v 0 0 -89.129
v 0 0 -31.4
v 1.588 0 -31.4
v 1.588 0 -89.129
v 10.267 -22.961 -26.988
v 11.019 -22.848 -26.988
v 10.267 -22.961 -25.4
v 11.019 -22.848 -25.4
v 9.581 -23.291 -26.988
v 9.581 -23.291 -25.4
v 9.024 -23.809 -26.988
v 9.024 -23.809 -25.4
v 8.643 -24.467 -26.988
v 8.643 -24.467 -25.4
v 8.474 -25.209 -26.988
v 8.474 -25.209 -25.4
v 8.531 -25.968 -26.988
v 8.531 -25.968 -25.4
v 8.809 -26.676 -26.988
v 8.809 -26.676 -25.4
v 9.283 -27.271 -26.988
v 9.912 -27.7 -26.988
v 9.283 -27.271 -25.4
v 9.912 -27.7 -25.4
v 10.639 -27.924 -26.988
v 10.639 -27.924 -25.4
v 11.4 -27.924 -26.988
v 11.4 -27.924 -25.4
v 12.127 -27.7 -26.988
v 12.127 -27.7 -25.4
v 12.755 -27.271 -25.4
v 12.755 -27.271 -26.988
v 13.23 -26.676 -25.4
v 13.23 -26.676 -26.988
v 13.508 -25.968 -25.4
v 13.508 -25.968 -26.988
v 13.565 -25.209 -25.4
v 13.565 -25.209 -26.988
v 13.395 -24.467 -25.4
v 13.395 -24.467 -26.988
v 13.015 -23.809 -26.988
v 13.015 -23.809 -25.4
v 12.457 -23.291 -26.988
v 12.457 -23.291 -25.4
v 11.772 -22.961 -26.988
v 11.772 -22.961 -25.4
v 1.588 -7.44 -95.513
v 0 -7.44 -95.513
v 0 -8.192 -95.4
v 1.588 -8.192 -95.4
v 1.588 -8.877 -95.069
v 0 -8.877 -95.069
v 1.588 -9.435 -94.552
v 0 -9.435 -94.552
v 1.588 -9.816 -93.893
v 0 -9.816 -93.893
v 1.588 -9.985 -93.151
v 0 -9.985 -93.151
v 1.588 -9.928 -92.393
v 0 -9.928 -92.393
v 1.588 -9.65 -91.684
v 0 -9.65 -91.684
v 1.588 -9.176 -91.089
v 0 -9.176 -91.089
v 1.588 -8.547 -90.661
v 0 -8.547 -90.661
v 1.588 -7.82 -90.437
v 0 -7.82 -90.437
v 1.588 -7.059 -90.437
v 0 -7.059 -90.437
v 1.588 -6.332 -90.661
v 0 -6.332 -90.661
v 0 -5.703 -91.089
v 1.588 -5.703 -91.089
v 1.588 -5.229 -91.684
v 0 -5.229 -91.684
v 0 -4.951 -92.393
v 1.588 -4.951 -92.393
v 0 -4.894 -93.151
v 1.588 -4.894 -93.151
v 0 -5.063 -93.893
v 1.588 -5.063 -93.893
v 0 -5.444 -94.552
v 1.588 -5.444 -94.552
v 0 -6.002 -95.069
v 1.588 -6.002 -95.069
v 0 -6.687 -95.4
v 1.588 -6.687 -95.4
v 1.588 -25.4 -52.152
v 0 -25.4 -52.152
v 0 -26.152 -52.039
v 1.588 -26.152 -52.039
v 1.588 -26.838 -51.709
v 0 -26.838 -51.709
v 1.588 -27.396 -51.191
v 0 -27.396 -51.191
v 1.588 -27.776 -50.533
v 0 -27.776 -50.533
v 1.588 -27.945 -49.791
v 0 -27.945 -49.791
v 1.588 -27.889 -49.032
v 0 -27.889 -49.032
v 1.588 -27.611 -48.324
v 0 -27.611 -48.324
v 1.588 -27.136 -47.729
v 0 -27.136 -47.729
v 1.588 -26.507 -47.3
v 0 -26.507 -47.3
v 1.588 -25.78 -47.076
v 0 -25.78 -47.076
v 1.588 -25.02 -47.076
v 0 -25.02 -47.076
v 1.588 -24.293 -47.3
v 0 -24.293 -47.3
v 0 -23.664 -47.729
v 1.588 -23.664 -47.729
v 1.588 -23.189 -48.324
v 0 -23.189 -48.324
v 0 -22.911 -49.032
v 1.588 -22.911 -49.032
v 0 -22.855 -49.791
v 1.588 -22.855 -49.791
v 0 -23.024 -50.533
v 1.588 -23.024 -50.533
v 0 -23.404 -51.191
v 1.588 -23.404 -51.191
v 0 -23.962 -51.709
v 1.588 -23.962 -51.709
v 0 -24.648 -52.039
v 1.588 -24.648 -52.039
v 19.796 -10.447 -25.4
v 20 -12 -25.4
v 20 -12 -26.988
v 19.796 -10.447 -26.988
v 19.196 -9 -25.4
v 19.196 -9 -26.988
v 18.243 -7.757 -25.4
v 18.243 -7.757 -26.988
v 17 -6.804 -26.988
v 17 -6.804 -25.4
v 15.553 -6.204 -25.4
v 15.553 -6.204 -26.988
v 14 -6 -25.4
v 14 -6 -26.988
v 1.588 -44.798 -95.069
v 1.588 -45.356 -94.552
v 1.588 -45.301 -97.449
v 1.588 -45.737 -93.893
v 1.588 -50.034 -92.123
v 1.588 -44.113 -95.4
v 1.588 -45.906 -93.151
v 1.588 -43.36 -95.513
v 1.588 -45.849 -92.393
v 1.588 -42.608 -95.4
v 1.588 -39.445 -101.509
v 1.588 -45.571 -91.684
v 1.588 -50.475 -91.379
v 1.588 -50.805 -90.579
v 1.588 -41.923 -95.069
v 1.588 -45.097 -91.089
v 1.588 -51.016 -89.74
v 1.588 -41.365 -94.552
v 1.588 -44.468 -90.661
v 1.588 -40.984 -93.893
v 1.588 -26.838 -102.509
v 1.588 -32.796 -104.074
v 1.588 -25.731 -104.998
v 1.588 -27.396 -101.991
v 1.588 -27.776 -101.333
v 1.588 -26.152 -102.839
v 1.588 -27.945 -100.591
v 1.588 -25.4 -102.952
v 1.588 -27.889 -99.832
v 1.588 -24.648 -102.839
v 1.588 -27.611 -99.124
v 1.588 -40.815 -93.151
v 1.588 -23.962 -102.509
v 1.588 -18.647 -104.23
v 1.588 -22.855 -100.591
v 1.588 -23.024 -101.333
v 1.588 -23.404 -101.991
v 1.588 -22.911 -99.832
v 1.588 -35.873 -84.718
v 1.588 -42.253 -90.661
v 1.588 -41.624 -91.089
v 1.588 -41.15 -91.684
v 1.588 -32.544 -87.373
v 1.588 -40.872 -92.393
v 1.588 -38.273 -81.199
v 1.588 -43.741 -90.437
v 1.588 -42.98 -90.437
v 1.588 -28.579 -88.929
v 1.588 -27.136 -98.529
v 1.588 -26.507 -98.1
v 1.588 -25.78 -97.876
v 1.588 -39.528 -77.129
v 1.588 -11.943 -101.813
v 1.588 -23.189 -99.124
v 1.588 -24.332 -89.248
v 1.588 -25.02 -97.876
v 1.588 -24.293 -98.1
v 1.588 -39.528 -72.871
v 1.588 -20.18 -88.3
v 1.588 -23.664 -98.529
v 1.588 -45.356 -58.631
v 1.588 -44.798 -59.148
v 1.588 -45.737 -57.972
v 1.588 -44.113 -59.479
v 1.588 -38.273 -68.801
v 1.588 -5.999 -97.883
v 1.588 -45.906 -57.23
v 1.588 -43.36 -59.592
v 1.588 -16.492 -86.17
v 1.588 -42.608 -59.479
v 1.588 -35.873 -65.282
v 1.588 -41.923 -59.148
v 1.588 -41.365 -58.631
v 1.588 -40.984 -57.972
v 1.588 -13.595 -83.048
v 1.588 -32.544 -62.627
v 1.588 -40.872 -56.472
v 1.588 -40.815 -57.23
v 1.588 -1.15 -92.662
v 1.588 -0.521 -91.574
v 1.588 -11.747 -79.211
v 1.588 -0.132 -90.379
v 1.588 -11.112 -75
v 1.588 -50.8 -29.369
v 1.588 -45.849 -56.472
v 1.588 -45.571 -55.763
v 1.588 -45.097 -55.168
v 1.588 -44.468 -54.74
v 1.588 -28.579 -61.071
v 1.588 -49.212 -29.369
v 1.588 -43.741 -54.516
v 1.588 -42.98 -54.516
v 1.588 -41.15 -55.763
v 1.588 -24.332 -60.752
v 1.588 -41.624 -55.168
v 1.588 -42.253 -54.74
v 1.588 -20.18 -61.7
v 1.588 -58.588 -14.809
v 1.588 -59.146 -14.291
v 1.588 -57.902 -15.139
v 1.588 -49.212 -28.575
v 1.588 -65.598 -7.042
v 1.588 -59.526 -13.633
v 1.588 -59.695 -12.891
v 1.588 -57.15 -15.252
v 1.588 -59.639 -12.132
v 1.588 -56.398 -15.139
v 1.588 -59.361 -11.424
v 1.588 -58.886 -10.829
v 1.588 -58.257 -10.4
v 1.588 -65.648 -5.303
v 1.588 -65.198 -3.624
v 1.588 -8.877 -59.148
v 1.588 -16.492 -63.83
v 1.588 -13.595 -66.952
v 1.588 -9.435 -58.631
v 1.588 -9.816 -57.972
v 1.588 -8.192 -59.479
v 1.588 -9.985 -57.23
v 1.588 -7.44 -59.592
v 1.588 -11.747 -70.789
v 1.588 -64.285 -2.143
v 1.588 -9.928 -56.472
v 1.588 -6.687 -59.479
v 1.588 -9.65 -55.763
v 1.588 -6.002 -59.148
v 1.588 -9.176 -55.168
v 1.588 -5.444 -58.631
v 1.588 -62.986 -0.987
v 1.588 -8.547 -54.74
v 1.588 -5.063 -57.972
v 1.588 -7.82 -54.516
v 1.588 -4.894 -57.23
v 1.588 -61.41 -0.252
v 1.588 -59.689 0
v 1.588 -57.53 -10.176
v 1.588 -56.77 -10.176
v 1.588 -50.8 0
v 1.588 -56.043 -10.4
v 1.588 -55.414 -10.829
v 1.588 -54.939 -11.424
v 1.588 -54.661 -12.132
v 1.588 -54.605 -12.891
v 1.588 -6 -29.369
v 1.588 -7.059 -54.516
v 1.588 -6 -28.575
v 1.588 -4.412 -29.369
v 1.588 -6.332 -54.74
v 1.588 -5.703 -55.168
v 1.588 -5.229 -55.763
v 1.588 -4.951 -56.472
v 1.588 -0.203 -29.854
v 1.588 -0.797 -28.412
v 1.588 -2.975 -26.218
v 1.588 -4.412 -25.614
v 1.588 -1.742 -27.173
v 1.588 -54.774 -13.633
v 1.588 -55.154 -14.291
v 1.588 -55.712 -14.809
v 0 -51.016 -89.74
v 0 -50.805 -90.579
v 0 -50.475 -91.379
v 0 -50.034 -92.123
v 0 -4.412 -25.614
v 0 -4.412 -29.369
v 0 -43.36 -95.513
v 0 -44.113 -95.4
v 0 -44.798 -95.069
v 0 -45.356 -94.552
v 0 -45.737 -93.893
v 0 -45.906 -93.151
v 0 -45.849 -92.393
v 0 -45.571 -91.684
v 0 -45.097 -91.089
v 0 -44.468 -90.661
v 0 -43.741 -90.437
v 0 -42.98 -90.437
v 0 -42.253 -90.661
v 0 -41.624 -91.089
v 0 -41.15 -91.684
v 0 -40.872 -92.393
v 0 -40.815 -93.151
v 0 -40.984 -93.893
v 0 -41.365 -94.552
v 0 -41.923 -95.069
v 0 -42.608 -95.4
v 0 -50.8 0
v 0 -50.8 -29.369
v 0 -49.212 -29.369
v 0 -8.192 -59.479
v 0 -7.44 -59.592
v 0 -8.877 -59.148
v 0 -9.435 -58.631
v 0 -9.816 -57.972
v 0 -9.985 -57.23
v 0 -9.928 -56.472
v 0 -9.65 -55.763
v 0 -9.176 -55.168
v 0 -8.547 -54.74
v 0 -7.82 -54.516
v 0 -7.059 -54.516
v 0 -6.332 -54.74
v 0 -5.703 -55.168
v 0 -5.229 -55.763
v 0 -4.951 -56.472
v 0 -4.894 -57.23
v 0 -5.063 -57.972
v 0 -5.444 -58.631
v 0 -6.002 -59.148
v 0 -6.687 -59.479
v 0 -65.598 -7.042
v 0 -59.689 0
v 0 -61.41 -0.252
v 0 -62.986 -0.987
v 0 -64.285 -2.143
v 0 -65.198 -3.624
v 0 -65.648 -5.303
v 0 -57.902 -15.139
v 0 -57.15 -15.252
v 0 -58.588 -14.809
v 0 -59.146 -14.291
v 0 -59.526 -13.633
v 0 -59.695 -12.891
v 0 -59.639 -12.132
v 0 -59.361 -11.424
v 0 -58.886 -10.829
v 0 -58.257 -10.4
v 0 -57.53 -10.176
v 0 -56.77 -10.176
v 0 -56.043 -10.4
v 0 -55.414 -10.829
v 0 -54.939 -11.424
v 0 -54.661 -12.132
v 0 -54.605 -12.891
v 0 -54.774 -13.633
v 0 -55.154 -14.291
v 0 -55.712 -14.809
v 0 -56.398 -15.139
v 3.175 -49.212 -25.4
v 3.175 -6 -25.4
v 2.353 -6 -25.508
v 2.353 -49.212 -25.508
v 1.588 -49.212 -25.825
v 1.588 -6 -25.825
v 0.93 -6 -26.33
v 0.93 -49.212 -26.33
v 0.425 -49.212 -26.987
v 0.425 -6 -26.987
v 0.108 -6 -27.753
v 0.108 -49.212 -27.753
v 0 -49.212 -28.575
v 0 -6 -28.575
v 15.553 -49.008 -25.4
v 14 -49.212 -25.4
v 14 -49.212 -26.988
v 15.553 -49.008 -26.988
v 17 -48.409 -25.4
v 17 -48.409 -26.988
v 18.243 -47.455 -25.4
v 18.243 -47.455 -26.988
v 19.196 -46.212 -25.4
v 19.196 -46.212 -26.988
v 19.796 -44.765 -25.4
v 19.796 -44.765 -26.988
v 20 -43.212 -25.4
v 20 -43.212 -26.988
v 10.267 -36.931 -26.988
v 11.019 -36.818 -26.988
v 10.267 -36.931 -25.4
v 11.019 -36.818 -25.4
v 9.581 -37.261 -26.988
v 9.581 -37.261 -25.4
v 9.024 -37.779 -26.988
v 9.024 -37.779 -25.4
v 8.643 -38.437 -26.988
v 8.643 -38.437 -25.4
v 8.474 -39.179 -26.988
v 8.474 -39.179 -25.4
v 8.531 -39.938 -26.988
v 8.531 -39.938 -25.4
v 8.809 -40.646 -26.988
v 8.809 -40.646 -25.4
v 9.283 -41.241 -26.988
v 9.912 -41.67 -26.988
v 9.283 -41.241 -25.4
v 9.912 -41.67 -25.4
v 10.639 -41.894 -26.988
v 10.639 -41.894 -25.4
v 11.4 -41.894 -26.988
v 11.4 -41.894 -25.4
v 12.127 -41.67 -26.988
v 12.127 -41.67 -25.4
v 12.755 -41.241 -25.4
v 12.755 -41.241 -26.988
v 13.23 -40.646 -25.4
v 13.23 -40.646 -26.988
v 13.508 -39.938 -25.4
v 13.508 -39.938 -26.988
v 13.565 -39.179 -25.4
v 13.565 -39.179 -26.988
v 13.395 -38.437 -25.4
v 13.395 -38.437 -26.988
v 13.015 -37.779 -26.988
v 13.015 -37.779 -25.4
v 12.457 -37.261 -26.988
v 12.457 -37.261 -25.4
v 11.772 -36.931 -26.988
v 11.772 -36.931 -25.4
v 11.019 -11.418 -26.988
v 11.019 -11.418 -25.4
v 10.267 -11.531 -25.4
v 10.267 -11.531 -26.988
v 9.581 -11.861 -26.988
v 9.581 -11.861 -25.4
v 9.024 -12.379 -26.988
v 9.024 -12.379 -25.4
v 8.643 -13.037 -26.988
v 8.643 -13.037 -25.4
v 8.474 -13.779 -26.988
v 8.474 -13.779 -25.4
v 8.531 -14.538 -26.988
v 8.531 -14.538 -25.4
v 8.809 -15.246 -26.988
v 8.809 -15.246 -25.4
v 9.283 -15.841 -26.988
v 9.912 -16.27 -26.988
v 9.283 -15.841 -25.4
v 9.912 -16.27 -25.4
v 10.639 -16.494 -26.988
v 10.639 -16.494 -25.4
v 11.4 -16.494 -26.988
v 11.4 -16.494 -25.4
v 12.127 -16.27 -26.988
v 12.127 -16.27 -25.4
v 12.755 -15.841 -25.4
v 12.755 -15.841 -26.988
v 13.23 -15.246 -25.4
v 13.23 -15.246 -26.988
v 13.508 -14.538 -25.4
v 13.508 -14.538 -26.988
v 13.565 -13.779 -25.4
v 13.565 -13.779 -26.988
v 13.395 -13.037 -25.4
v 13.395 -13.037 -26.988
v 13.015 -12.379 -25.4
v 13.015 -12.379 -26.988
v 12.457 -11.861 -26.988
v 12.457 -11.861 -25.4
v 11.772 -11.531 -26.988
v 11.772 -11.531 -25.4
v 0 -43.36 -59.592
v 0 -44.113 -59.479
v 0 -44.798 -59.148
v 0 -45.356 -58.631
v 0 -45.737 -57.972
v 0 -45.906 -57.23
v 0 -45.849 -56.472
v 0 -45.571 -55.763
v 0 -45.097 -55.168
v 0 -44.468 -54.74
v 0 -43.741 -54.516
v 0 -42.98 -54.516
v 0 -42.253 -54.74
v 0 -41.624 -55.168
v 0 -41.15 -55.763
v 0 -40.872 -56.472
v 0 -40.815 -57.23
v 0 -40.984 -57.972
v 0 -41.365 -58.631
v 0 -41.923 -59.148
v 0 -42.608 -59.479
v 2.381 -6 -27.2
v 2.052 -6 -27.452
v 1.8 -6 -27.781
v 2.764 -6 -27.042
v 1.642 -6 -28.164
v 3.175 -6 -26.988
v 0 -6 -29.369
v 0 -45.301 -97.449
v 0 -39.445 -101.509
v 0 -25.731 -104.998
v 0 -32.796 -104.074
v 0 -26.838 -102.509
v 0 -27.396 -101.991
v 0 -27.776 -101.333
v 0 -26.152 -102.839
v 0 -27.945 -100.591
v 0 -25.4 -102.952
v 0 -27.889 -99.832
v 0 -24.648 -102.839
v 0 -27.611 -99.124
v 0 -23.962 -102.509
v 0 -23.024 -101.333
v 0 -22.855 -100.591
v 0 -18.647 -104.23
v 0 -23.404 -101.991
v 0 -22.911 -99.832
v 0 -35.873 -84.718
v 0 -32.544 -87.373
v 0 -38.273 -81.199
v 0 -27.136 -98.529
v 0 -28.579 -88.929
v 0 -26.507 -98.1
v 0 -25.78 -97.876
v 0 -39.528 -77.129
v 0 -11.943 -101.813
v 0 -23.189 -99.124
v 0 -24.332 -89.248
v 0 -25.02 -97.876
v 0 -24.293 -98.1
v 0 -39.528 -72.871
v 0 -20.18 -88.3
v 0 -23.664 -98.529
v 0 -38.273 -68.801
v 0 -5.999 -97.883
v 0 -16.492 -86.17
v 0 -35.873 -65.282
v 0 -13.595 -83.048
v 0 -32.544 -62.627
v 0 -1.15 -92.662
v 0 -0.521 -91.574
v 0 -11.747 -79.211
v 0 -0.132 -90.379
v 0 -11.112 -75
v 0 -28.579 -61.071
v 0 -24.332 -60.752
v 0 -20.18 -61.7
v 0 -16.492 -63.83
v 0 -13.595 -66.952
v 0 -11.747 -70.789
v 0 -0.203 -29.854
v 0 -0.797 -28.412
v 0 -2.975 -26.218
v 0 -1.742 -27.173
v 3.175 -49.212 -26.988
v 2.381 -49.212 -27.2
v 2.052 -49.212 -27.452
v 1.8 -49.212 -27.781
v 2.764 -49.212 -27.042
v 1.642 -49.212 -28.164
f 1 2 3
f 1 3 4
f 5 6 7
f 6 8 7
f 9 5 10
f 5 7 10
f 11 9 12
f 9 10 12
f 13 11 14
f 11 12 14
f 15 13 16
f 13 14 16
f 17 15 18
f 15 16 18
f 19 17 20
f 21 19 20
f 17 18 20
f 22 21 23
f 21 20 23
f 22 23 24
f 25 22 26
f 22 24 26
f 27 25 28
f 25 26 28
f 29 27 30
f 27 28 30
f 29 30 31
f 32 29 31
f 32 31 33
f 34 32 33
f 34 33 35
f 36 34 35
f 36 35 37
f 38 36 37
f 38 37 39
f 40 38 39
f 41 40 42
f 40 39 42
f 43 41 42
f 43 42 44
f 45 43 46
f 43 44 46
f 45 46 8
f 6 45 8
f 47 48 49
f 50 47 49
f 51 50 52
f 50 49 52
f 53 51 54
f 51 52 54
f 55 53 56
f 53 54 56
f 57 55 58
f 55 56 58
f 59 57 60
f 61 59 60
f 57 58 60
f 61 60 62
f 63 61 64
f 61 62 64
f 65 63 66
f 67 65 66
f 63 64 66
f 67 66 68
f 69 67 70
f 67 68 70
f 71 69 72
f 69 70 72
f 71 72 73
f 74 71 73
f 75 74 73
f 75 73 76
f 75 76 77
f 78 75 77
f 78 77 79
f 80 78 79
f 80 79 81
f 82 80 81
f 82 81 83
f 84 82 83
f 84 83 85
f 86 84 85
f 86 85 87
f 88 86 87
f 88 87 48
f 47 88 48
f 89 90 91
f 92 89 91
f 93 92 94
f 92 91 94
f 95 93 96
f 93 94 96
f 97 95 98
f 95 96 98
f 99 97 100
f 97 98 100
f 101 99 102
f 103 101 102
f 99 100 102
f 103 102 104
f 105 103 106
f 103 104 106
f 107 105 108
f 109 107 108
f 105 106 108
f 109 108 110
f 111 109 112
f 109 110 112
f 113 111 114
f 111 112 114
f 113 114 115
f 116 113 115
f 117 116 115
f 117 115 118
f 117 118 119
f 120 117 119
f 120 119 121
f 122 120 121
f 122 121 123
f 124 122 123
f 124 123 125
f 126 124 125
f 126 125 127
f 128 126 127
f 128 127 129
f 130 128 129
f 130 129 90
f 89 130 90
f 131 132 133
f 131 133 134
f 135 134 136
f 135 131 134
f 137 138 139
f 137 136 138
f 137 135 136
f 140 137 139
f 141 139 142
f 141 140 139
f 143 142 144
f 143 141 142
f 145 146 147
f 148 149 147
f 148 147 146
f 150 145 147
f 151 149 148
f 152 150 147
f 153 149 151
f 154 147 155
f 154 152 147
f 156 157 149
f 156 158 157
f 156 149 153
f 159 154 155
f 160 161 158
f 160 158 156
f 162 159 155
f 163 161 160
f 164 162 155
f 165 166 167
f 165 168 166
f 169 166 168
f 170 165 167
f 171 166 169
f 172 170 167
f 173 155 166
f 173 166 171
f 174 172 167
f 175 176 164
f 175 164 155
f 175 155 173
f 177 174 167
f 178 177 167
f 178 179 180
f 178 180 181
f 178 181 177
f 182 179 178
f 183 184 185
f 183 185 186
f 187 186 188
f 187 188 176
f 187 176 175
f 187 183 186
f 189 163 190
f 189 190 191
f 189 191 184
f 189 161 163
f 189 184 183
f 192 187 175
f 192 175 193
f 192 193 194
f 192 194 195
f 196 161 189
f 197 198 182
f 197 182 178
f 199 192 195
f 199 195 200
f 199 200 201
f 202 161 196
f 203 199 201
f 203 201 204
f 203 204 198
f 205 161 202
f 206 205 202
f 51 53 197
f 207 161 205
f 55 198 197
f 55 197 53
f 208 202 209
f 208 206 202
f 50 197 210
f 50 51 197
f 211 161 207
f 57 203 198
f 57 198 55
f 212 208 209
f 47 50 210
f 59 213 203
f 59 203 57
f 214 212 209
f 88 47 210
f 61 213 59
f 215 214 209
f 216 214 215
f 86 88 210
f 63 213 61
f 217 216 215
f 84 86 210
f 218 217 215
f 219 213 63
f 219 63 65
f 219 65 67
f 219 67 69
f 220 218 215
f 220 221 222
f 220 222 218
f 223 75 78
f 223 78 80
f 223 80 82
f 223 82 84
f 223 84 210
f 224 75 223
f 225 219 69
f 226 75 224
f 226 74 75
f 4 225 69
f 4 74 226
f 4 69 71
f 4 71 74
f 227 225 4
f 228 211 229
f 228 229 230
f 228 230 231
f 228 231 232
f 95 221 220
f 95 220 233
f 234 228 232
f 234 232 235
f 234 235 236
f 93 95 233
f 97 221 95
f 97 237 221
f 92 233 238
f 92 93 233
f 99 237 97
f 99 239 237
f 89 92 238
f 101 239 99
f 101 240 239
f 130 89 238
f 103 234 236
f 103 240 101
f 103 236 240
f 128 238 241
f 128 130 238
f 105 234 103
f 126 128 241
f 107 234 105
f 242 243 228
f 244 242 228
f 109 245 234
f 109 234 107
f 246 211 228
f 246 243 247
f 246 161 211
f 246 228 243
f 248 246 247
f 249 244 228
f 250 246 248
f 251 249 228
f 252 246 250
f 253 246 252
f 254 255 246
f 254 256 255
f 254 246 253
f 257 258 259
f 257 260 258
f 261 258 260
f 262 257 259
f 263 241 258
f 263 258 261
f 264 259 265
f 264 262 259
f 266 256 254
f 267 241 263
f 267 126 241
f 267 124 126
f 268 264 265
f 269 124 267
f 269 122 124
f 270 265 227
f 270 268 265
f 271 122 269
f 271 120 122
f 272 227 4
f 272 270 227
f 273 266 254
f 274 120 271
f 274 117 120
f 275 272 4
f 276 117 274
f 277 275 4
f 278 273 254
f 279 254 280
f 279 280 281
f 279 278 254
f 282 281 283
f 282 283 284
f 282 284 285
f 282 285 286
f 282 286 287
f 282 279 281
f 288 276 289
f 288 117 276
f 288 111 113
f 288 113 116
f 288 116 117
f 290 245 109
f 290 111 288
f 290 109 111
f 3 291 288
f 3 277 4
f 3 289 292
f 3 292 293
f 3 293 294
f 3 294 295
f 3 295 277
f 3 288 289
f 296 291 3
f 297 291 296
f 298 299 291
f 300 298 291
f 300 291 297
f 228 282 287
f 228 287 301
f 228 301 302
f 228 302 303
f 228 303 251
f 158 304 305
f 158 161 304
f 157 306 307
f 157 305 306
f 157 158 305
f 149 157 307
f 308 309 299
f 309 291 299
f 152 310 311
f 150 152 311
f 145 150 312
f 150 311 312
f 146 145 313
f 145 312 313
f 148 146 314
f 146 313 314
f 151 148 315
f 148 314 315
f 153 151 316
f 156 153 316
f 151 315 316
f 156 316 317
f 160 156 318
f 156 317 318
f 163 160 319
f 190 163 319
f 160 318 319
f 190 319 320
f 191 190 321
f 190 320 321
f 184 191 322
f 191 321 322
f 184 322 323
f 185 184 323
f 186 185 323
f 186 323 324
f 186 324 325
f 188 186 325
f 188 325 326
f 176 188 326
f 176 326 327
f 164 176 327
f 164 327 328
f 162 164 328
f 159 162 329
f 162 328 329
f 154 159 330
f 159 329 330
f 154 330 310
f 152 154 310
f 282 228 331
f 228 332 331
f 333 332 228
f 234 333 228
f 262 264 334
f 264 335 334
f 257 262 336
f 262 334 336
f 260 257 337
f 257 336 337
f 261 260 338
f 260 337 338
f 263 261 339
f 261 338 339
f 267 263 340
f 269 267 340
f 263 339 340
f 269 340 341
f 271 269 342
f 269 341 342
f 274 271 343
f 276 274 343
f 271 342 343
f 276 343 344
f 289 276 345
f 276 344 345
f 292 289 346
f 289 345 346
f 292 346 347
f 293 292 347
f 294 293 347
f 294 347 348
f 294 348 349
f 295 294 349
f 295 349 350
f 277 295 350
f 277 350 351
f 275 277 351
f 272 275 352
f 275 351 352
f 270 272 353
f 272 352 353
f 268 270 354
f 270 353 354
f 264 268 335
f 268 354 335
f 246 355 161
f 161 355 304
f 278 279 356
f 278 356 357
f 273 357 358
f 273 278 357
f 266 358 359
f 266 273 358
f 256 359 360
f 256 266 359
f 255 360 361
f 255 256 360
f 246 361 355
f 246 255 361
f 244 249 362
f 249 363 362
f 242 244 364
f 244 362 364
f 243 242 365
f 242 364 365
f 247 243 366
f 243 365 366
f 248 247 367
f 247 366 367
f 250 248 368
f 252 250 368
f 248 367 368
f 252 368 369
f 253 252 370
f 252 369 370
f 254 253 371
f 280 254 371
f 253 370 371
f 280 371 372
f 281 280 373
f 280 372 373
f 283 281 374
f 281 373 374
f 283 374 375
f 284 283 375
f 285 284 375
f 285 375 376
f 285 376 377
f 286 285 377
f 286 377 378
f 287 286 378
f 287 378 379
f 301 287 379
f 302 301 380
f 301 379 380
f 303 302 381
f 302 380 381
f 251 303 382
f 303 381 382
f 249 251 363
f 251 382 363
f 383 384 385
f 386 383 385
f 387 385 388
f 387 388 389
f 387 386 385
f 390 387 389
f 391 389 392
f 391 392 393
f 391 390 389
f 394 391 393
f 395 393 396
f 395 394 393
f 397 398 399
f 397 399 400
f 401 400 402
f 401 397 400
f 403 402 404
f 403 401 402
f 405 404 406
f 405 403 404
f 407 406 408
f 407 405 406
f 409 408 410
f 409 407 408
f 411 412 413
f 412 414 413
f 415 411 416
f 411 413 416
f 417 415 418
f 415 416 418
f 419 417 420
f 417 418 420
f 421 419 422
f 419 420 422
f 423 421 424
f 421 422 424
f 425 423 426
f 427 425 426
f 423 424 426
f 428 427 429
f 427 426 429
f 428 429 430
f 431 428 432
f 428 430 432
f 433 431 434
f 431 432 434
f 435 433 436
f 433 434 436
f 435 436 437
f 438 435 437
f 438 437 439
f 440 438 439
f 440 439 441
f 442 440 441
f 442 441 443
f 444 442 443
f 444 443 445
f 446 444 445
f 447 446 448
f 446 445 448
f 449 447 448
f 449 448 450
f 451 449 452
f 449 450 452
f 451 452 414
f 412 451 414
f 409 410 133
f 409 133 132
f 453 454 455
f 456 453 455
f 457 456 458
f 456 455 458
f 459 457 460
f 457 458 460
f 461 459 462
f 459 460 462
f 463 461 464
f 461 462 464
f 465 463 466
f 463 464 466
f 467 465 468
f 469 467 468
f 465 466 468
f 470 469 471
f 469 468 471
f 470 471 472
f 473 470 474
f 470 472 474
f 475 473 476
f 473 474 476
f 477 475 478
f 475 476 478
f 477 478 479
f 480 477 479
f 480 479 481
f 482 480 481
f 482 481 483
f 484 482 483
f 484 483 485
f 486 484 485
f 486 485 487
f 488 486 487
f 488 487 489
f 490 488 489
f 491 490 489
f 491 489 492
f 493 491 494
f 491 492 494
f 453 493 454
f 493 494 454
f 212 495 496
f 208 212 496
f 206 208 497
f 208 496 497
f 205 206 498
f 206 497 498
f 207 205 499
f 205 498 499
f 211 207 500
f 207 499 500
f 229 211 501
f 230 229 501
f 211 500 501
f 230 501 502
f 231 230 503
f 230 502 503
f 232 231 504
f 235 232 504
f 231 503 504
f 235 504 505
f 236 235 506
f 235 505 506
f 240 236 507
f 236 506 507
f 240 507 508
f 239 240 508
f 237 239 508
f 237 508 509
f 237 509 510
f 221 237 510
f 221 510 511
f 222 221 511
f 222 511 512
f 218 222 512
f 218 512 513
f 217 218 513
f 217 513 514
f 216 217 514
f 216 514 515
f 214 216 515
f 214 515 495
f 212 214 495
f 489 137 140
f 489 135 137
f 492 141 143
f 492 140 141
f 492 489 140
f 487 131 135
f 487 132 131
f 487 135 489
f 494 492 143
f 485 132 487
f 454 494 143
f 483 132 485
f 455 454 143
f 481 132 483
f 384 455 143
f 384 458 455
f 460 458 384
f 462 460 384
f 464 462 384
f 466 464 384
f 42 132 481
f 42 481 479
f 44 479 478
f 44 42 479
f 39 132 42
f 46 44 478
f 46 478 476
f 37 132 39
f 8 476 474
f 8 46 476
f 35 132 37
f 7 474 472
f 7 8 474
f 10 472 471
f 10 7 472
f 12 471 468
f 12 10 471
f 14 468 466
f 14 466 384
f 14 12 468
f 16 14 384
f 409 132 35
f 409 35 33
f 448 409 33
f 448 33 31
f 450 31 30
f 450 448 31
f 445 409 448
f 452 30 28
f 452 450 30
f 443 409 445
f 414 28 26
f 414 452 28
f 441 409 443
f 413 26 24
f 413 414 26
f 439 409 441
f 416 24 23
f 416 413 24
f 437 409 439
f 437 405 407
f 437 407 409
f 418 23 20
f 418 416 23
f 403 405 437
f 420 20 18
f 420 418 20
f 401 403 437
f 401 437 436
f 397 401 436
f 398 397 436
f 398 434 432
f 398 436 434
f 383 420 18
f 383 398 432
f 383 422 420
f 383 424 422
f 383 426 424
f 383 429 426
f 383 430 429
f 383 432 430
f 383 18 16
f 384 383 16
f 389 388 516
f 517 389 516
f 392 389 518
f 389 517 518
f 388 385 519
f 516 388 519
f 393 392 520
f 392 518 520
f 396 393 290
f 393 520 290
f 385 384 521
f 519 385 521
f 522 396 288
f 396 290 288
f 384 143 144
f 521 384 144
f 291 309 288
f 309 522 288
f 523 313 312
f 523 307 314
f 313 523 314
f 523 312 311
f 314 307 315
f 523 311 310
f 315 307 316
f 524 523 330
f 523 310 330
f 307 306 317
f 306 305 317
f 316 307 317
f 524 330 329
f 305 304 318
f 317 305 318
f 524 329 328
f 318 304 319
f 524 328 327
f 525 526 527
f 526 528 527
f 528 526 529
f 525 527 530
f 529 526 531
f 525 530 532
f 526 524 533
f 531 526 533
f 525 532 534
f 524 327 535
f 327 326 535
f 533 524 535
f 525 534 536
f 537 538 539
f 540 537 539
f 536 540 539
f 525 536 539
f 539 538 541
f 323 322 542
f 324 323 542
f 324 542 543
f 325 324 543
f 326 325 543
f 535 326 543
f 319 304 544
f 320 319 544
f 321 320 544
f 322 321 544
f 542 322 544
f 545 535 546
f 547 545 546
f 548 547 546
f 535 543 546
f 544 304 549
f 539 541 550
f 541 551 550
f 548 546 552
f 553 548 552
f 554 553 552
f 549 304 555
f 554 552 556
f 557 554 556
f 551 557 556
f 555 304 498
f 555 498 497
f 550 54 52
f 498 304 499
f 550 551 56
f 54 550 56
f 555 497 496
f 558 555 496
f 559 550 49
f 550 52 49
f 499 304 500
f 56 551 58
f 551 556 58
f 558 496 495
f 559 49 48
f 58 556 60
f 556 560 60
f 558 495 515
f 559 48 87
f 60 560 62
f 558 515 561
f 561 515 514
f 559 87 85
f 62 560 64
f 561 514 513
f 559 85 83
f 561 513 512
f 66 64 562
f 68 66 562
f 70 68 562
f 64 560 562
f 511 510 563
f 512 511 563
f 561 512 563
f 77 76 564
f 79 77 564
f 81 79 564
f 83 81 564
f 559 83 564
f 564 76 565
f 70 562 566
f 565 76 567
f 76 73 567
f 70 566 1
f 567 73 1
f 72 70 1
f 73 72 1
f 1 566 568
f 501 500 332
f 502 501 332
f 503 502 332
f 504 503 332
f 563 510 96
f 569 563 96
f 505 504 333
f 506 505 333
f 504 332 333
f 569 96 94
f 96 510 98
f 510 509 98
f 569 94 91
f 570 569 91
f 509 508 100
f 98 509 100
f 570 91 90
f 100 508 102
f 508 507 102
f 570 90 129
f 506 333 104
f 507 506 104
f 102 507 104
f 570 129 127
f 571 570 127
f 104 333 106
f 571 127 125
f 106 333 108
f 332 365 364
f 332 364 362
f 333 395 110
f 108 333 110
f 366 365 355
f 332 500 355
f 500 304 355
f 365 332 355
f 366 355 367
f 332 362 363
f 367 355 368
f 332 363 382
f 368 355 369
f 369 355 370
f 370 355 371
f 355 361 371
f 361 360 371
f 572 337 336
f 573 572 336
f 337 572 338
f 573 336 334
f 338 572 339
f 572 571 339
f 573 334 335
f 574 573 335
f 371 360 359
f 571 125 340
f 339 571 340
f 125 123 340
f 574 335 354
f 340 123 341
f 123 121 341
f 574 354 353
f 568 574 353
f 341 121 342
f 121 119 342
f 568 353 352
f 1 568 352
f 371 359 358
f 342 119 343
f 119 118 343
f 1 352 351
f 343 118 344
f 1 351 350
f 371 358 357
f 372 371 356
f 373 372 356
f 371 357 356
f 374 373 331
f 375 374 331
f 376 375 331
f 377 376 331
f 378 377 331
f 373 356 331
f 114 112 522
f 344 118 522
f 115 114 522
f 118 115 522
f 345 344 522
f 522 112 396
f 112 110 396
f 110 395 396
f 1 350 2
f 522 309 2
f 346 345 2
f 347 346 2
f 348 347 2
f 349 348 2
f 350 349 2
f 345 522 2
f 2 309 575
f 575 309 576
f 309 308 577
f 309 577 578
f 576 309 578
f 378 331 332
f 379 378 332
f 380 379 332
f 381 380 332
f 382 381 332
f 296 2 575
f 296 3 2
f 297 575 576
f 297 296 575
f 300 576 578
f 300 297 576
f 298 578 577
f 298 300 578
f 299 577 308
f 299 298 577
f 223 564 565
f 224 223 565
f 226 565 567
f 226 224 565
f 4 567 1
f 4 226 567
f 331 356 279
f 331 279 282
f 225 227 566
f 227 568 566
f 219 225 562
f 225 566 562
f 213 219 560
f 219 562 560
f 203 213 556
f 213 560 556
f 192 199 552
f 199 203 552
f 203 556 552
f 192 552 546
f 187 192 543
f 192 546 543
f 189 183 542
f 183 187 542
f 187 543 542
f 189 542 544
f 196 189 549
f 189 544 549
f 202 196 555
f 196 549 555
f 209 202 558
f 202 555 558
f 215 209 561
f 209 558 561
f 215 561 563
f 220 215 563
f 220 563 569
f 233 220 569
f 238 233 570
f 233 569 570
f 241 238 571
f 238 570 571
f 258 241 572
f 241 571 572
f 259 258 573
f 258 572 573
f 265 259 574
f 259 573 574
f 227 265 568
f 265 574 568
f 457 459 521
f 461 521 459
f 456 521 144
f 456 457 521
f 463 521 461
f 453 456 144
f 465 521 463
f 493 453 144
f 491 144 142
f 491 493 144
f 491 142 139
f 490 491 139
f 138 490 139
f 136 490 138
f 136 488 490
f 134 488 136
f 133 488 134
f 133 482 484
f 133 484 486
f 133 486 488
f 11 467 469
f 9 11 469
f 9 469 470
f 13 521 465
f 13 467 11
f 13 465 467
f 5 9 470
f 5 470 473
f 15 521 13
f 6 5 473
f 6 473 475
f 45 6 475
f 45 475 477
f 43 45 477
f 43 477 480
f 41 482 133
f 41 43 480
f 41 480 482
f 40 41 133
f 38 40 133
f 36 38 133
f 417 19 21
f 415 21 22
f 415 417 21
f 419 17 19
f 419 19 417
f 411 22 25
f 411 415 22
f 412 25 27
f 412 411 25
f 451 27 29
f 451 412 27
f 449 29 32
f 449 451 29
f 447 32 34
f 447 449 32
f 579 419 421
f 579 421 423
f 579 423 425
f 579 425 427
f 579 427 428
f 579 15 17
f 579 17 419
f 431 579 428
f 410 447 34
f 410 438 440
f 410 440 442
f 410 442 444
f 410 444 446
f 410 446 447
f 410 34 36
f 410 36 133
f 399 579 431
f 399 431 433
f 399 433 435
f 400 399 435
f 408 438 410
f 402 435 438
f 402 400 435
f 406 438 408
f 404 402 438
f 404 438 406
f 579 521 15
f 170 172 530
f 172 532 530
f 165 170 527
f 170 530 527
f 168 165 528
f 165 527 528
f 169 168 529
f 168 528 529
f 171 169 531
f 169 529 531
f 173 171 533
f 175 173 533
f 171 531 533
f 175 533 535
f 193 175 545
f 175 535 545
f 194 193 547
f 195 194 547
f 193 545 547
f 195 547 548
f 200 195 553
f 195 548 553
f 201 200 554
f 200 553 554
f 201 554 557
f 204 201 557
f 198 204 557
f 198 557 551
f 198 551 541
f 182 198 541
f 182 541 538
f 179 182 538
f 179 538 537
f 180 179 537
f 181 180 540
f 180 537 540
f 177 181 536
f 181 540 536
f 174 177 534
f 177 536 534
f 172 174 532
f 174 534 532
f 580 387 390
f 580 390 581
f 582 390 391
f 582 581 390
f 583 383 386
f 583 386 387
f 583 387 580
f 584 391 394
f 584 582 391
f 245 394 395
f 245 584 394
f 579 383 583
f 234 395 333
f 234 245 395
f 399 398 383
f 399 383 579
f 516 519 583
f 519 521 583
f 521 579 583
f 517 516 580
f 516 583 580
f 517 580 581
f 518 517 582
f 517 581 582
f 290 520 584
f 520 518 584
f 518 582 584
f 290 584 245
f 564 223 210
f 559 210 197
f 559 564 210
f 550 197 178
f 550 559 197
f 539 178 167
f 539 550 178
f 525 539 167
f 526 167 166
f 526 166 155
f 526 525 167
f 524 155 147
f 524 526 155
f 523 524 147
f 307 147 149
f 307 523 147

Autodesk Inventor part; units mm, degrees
ref_plane "YZ Plane" through (0, 0, 0) normal (1, 0, 0) x (0, 1, 0)
ref_plane "XZ Plane" through (0, 0, 0) normal (0, 1, 0) x (-1, 0, 0)
ref_plane "XY Plane" through (0, 0, 0) normal (0, 0, 1) x (1, 0, 0)
sketch "Sketch1" plane through (0, 0, 0) normal (1, 0, 0) x (0, 1, 0)
  line L0 (-39.3892, -105) -> (-110, -20.8494)
  line L1 (-110, -20.8494) -> (-110, 0)
  line L2 (-110, 0) -> (0, 0)
  line L3 (0, 0) -> (0, -105)
  line L4 (0, -105) -> (-39.3892, -105)
  line L5 (-110, -20.8494) -> (-119.38, 0) construction
  line L6 (-119.38, 0) -> (-110, 0) construction
  line L7 (-50.8, -25.4) -> (0, -25.4) construction
  line L8 (0, -25.4) -> (0, 0) construction
  line L9 (0, 0) -> (-50.8, 0) construction
  line L10 (-50.8, 0) -> (-50.8, -25.4) construction
  line L11 (-50.8, -25.4) -> (0, 0) construction
  line L12 (0, -25.4) -> (-50.8, 0) construction
  circle A0 centre (-12.7, -12.7) radius 3
  circle A1 centre (-38.1, -12.7) radius 3
  circle A2 centre (-25.4, -75) radius 14.2875
  circle A3 centre (-25.4, -75) radius 30
  line L13 (-50.8, -90.9637) -> (-50.8, -59.0363)
  line L14 (-50.8, -25.4) -> (0, -25.4)
  line L15 (-66.8394, 0) -> (-50.8, -90.9637)
  line L16 (-50.8, -25.4) -> (-50.8, 0)
  point P0 (-25.4, -12.7)
  point P1 (-25.4, -25.4)
  point P2 (-50.8, -75)
  point P3 (0, -90.9637)
  point P4 (0, -25.4)
  point P5 (-50.8, 0)
  dimension "d0" = 50
  dimension "d1" = 119.38
  dimension "d2" = 50.8
  dimension "d3" = 25.4
  dimension "d4" = 25.4
  dimension "d5" = 12.7
  dimension "d6" = 6
  dimension "d7" = 6
  dimension "d11" = 75
  dimension "d13" = 110
  dimension "d16" = 60
  dimension "d17" = 25.4
  dimension "d18" = 25.4
  dimension "d31" = 28.575
  dimension "d33" = 10
extrude "Plate1" add sketch "Sketch1" along normal blind 1.5875 contours A3 L13 L3 | L15 A3 L13 | L15 L2 L16 L14 L3 A3
fillet "Corner Round2" radius 6 4 edges at (0.7937, 0, -90.9637) (0.7937, -50.8, -90.9637) (0.7937, 0, -25.4) (0.7937, -66.8394, 0)
sketch "Sketch3" plane through (0, -50.8, -26.9875) normal (0, 0, 1) x (1, 0, 0)
  line L0 (0, 44.8) -> (0, 1.5875)
  line L1 (0, 1.5875) -> (20, 1.5875)
  line L2 (20, 1.5875) -> (20, 44.8)
  line L3 (20, 44.8) -> (0, 44.8)
edge flange "Flange1" height 20 angle 90 thickness 1.5875 bend radius 1.5875 thickness toward (0, 0, 1) relief straight relief width 1.5875 relief depth 0.7937 edges at (1.5875, -28.4, -25.4) wall of the first edge with corners at (0, -6, -26.9875) (0, -49.2125, -26.9875) (20, -49.2125, -26.9875) (20, -6, -26.9875)
bend "Bend1"
corner "Corner1"
sketch "Sketch4" plane through (1.5875, 0, 0) normal (1, 0, 0) x (0, 0, -1)
  circle A0 centre (75, -25.4) radius 14.2875 projected
  point P0 (0, 0)
  point P1 (100.4, -25.4)
  point P2 (92.9605, -7.4395)
  point P3 (75, 0)
  point P4 (57.0395, -7.4395)
  point P5 (49.6, -25.4)
  point P6 (57.0395, -43.3605)
  point P7 (75, -50.8)
  point P8 (92.9605, -43.3605)
  dimension "d45" = 25.4
  dimension "d48" = 360
hole "Hole2" at (1.5875, -25.4, -100.4) at (1.5875, -7.4395, -92.9605) at (1.5875, -7.4395, -57.0395) at (1.5875, -25.4, -49.6) at (1.5875, -43.3605, -57.0395) at (1.5875, -43.3605, -92.9605) direction (-1, 0, 0) diameter 5.105 depth 1.5875 tip angle 118 clearance for "Flat Head Machine Screw (82)" size "#10" standard "Ansi Unified Screw Threads"
sketch "Sketch5" plane through (20, -49.2125, -26.9875) normal (0, 0, -1) x (-1, 0, 0)
  line L0 (0, 0) -> (16.825, 0) projected
  line L1 (16.825, 0) -> (16.825, 43.2125) projected
  point P0 (20, 49.2125)
  point P1 (8.9807, 9.8425)
  point P2 (8.9807, 35.2425)
  point P3 (8.4125, 0)
  point P4 (8.9807, 23.8125)
  dimension "d57" = 25.4
  dimension "d58" = 9.8425
  dimension "d67" = 23.8125
  dimension "d68" = 7.8443
hole "Hole3" at (11.0193, -39.37, -26.9875) at (11.0193, -13.97, -26.9875) at (11.0193, -25.4, -26.9875) direction (0, 0, 1) diameter 5.105 end through all clearance for "Flat Head Machine Screw (82)" size "#10" standard "Ansi Unified Screw Threads"
fillet "Corner Round3" radius 6 2 edges at (20, -49.2125, -26.1938) (20, -6, -26.1937)
sketch "Sketch6" plane through (1.5875, 0, 0) normal (1, 0, 0) x (0, 0, -1)
  line L0 (29.3688, -50.8) -> (0, -50.8) projected
  line L1 (0, -59.6888) -> (0, -50.8) projected
  point P0 (0, 0)
  point P1 (12.7, -57.15)
  dimension "d69" = 6.35
  dimension "d70" = 12.7
hole "Hole4" at (1.5875, -57.15, -12.7) direction (-1, 0, 0) diameter 5.105 end through all clearance for "Flat Head Machine Screw (82)" size "#10" standard "Ansi Unified Screw Threads"
equation "\"d5\" = 0.5 * d4"
equation "\"d7\" = d6"
equation "\"d55\" = Thickness"
equation "\"d76\" = Thickness"
equation "\"d14\" = Thickness"
equation "\"d35\" = BendReliefWidth"
equation "\"d36\" = BendReliefDepth"
equation "\"d37\" = MinimumRemnant"
equation "\"d38\" = TransitionRadius"
equation "\"d41\" = BendRadius"
equation "\"d42\" = CornerReliefSize"
equation "\"d43\" = GapSize"
equation "\"d44\" = JacobiRadiusSize"
equation "\"d18\" = d17"
equation "\"BendRadius\" = Thickness"
equation "\"BendReliefWidth\" = Thickness"
equation "\"BendReliefDepth\" = 0.5 * Thickness"
equation "\"CornerReliefSize\" = 4 * Thickness"
equation "\"MinimumRemnant\" = 2 * Thickness"
equation "\"TransitionRadius\" = BendRadius"
equation "\"JacobiRadiusSize\" = BendRadius"
equation "\"GapSize\" = Thickness"
equation "\"Thickness\" = 1.5875"
properties part number "INSIDE_INTAKE_PLATE_MOTOR_MOUNT" material "Aluminum, 6061-T6"
